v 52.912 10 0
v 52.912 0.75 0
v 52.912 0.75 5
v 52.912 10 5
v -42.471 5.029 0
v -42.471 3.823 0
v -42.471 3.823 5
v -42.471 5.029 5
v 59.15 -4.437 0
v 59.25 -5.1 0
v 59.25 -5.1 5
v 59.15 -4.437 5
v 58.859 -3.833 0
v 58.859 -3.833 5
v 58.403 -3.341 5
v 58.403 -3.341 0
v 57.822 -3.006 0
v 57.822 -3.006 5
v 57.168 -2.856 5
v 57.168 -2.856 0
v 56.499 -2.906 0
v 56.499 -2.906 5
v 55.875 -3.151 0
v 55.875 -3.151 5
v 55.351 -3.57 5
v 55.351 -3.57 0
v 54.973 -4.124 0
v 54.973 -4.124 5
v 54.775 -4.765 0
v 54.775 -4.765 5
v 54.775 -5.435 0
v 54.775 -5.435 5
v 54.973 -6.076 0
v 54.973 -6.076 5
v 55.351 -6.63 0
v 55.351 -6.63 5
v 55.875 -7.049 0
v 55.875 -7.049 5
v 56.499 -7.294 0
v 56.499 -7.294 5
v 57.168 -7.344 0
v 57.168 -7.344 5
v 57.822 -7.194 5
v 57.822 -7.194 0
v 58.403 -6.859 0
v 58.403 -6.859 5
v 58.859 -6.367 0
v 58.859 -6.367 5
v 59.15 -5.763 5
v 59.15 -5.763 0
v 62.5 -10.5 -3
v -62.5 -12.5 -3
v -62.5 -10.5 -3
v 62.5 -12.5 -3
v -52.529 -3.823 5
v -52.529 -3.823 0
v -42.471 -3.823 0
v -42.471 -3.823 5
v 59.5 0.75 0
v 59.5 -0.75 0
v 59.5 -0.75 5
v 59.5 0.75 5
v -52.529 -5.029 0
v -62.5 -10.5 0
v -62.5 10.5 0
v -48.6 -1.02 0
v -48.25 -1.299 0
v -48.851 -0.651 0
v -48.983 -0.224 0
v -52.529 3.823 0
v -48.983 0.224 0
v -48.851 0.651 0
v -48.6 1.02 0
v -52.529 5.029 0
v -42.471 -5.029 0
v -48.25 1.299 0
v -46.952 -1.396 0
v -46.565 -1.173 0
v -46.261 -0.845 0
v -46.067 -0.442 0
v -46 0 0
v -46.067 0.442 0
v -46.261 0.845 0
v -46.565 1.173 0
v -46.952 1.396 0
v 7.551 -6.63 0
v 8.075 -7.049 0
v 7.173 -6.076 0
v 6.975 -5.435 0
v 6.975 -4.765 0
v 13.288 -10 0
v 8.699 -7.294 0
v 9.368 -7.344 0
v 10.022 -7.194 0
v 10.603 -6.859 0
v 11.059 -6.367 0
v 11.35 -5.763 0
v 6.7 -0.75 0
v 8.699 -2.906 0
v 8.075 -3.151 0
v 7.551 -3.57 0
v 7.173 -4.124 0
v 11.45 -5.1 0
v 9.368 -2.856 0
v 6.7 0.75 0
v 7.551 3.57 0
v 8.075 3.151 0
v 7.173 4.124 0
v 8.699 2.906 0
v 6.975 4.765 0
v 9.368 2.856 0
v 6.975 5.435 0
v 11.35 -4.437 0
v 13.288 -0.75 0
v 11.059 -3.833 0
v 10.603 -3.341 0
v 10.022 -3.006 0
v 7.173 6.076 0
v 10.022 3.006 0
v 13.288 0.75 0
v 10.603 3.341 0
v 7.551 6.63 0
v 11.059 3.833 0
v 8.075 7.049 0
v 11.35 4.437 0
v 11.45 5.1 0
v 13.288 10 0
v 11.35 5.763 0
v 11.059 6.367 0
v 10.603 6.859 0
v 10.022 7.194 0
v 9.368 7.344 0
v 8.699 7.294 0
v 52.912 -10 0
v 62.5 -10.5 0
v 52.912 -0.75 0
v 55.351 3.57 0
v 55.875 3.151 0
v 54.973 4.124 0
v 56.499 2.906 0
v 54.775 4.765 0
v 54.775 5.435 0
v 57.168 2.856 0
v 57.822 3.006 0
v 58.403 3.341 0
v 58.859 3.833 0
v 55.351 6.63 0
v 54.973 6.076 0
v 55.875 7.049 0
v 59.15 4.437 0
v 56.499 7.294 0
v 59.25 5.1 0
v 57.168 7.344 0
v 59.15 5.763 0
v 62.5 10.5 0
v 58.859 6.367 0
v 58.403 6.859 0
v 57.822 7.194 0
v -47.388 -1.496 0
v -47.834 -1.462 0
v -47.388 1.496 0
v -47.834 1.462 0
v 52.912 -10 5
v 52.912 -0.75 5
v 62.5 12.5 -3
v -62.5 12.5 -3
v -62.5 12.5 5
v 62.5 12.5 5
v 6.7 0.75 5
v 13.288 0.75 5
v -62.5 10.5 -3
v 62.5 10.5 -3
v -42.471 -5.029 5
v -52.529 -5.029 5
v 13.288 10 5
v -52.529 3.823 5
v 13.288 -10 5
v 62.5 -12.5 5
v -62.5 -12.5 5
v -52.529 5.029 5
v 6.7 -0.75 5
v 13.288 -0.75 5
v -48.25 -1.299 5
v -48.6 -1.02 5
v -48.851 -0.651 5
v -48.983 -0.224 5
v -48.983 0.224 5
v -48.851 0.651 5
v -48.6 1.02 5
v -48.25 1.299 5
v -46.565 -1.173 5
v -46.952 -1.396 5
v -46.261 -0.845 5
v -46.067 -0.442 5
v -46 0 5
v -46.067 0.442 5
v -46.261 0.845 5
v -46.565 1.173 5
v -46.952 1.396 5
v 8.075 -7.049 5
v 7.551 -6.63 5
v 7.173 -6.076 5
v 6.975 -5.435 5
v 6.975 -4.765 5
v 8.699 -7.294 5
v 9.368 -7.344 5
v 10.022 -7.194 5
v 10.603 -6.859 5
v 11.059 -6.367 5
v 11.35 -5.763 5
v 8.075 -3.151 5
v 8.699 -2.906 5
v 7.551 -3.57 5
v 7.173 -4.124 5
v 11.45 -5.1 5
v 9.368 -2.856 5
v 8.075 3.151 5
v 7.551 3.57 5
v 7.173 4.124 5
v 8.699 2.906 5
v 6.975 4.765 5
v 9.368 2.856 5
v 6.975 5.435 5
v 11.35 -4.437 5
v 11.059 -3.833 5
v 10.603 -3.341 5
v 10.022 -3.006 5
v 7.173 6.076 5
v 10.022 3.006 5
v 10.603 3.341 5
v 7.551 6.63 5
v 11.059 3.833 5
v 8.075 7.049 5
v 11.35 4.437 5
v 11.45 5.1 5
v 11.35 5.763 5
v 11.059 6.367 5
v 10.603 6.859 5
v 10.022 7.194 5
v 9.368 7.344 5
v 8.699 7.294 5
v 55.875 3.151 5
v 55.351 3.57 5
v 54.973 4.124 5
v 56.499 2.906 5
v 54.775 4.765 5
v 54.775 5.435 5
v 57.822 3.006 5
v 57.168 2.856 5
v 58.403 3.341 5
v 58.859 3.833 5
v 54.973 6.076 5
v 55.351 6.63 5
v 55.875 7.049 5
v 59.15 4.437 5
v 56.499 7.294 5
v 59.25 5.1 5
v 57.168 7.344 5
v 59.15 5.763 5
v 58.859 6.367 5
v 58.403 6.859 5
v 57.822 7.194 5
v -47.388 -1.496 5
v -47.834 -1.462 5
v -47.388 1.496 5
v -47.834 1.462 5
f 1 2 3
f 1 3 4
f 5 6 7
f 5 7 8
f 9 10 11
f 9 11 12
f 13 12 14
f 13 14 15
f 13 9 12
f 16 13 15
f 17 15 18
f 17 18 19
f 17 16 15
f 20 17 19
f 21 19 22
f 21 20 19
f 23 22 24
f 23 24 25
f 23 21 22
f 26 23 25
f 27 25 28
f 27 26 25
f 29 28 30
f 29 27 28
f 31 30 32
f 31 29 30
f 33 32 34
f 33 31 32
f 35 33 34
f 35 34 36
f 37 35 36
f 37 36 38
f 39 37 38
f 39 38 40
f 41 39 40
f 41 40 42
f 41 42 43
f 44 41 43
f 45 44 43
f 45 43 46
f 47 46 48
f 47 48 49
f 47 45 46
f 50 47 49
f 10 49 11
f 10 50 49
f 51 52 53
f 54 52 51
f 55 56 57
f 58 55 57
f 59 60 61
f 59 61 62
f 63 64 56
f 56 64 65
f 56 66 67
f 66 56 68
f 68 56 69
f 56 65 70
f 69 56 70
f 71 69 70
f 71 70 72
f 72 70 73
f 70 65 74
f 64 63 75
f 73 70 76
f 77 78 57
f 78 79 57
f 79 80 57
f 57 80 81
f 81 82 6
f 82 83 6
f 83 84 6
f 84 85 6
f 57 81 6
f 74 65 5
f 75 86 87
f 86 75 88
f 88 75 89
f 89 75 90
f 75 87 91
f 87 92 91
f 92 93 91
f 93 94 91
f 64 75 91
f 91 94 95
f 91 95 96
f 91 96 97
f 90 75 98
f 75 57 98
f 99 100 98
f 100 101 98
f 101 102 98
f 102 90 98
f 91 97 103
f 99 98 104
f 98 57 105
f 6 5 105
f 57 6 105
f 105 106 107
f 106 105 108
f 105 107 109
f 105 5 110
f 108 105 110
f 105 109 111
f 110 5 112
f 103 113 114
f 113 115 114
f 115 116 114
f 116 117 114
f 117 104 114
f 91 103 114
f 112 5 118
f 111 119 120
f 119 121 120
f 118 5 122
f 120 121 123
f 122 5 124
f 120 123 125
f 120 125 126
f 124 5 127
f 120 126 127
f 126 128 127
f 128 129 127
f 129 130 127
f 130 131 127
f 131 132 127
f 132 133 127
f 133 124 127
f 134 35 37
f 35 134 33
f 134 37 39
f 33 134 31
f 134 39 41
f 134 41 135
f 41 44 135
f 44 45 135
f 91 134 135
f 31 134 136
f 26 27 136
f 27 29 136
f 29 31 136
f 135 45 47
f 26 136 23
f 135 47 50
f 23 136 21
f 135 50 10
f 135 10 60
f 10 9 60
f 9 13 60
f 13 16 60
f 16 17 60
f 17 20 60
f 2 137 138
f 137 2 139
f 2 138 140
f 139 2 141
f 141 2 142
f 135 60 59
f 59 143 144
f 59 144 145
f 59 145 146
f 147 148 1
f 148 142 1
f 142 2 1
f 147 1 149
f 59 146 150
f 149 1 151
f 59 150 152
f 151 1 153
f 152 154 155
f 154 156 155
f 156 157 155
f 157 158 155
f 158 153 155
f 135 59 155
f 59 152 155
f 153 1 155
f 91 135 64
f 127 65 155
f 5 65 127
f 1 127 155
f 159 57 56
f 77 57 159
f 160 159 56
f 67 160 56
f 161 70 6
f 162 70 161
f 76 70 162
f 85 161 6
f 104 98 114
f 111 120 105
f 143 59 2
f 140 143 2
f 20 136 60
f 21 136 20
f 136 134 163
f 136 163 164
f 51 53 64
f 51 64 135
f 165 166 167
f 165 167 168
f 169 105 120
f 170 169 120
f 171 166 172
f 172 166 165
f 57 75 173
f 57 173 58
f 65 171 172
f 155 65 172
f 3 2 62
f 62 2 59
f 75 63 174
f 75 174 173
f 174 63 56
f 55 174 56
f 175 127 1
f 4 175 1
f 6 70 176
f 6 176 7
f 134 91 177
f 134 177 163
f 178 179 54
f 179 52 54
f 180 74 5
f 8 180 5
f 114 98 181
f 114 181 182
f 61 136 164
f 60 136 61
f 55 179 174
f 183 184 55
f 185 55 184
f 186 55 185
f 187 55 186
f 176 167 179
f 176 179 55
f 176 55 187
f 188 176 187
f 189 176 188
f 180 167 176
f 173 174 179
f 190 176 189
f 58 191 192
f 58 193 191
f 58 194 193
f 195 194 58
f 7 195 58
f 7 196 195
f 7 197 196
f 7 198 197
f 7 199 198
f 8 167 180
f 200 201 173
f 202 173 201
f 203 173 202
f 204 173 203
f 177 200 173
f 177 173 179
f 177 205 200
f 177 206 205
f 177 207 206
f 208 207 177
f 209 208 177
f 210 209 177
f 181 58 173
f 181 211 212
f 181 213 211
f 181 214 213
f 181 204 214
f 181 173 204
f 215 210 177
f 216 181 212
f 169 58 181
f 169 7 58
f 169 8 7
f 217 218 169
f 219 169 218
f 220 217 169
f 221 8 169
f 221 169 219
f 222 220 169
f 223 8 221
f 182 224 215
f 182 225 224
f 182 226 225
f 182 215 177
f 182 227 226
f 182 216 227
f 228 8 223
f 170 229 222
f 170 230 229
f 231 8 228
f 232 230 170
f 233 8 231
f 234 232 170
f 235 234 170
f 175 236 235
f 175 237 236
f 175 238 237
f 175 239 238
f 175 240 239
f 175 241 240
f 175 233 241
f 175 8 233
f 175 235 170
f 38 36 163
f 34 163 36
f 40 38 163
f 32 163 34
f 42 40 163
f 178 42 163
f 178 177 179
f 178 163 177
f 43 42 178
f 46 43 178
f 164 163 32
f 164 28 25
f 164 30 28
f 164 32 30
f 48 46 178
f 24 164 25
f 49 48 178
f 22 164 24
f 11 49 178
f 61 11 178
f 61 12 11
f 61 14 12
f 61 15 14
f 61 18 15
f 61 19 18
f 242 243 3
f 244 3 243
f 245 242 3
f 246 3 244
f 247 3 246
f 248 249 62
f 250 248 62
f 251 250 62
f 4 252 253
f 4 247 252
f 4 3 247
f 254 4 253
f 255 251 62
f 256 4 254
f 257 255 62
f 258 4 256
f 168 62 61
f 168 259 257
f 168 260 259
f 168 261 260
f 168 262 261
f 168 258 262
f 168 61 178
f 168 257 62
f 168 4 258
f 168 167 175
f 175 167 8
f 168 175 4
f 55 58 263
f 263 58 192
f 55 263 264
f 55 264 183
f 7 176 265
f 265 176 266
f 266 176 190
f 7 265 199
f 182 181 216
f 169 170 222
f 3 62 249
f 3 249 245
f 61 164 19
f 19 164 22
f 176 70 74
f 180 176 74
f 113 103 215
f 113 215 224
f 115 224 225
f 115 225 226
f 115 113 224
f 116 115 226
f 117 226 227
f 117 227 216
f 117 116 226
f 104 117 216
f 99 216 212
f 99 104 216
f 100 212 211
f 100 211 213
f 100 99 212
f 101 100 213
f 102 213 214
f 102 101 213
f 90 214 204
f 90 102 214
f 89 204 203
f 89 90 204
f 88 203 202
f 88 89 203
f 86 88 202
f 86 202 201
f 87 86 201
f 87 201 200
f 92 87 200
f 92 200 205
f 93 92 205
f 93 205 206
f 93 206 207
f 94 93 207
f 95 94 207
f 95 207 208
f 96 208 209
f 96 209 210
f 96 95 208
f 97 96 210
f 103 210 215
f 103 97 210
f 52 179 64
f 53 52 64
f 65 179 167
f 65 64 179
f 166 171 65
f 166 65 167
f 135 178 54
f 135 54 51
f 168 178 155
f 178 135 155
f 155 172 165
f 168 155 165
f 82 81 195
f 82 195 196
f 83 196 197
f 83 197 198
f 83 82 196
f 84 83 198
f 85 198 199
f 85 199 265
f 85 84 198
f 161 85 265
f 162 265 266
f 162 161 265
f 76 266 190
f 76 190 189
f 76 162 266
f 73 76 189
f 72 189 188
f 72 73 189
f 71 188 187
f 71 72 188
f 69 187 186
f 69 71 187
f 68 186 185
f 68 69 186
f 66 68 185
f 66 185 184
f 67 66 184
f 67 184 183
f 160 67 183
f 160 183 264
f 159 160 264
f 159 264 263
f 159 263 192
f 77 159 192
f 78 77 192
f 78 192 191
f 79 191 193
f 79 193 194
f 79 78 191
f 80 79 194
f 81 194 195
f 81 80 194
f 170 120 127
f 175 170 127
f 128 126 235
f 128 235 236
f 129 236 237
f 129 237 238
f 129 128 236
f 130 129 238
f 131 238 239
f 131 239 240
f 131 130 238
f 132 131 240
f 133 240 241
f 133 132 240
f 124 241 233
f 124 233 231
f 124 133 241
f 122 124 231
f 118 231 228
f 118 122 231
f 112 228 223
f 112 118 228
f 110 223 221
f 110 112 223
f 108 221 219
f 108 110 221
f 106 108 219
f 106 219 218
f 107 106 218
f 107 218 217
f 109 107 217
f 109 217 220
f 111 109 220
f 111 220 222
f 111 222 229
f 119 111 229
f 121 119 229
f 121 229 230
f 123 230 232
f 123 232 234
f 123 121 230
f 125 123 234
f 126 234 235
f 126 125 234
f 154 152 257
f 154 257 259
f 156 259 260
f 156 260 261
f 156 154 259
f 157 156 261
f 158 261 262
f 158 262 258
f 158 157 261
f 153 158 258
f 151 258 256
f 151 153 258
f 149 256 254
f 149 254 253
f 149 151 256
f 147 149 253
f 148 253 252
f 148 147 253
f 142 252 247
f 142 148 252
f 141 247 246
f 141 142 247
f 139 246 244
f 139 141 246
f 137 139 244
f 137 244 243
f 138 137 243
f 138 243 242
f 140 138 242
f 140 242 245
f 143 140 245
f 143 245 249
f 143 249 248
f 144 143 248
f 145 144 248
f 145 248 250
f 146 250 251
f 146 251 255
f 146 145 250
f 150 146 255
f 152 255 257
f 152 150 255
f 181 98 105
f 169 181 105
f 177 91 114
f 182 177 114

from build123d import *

# Parameters (mm, degrees)
SKETCH1_W           = 125
SKETCH1_H           = 25
SKETCH1_W_2         = 10.0584
SKETCH1_H_2         = 10.0584
SKETCH1_W_3         = 52.8
SKETCH1_H_3         = 20
SKETCH1_H_4         = 7.6454
SKETCH1_R           = 1.5
SKETCH1_W_4         = 6.588
SKETCH1_H_5         = 9.25
SKETCH1_R_2         = 2.25
BOSS_EXTRUDE1_DEPTH = 5
SKETCH3_W           = 125
SKETCH3_H           = 8
BOSS_EXTRUDE2_DEPTH = 2
BOSS_EXTRUDE3_START = -25
SKETCH3_2_W         = 125
SKETCH3_2_H         = 8
BOSS_EXTRUDE3_DEPTH = 2


with BuildPart() as part:
    # Sketch1 → Boss-Extrude1 (new body)
    with BuildSketch(Plane.XY):
        Rectangle(SKETCH1_W, SKETCH1_H)
        with Locations((-47.5, 0)):
            Rectangle(SKETCH1_W_2, SKETCH1_H_2, mode=Mode.SUBTRACT)
        with Locations((33.1, 0)):
            Rectangle(SKETCH1_W_3, SKETCH1_H_3, mode=Mode.SUBTRACT)
        with Locations((-47.5, 0)):
            Rectangle(SKETCH1_W_2, SKETCH1_H_4)
        with Locations((-47.5, 0)):
            Circle(SKETCH1_R, mode=Mode.SUBTRACT)
        with Locations((56.206, 5.375)):
            Rectangle(SKETCH1_W_4, SKETCH1_H_5)
        with Locations((57, 5.1)):
            Circle(SKETCH1_R_2, mode=Mode.SUBTRACT)
        with Locations((56.206, -5.375)):
            Rectangle(SKETCH1_W_4, SKETCH1_H_5)
        with Locations((57, -5.1)):
            Circle(SKETCH1_R_2, mode=Mode.SUBTRACT)
        with Locations((9.994, -5.375)):
            Rectangle(SKETCH1_W_4, SKETCH1_H_5)
        with Locations((9.2, -5.1)):
            Circle(SKETCH1_R_2, mode=Mode.SUBTRACT)
        with Locations((9.994, 5.375)):
            Rectangle(SKETCH1_W_4, SKETCH1_H_5)
        with Locations((9.2, 5.1)):
            Circle(SKETCH1_R_2, mode=Mode.SUBTRACT)
    extrude(amount=BOSS_EXTRUDE1_DEPTH)

    # Sketch3 → Boss-Extrude2 (add)
    with BuildSketch(Plane(origin=(0, 12.5, 0), x_dir=(1, 0, 0), z_dir=(0, 1, 0))):
        with Locations((0, -1)):
            Rectangle(SKETCH3_W, SKETCH3_H)
    extrude(amount=-BOSS_EXTRUDE2_DEPTH)

    # Sketch3<2> → Boss-Extrude3 (add)
    with BuildSketch(Plane(origin=(0, 12.5, 0), x_dir=(1, 0, 0), z_dir=(0, 1, 0)).offset(BOSS_EXTRUDE3_START)):
        with Locations((0, -1)):
            Rectangle(SKETCH3_2_W, SKETCH3_2_H)
    extrude(amount=BOSS_EXTRUDE3_DEPTH)


solid = part.part
